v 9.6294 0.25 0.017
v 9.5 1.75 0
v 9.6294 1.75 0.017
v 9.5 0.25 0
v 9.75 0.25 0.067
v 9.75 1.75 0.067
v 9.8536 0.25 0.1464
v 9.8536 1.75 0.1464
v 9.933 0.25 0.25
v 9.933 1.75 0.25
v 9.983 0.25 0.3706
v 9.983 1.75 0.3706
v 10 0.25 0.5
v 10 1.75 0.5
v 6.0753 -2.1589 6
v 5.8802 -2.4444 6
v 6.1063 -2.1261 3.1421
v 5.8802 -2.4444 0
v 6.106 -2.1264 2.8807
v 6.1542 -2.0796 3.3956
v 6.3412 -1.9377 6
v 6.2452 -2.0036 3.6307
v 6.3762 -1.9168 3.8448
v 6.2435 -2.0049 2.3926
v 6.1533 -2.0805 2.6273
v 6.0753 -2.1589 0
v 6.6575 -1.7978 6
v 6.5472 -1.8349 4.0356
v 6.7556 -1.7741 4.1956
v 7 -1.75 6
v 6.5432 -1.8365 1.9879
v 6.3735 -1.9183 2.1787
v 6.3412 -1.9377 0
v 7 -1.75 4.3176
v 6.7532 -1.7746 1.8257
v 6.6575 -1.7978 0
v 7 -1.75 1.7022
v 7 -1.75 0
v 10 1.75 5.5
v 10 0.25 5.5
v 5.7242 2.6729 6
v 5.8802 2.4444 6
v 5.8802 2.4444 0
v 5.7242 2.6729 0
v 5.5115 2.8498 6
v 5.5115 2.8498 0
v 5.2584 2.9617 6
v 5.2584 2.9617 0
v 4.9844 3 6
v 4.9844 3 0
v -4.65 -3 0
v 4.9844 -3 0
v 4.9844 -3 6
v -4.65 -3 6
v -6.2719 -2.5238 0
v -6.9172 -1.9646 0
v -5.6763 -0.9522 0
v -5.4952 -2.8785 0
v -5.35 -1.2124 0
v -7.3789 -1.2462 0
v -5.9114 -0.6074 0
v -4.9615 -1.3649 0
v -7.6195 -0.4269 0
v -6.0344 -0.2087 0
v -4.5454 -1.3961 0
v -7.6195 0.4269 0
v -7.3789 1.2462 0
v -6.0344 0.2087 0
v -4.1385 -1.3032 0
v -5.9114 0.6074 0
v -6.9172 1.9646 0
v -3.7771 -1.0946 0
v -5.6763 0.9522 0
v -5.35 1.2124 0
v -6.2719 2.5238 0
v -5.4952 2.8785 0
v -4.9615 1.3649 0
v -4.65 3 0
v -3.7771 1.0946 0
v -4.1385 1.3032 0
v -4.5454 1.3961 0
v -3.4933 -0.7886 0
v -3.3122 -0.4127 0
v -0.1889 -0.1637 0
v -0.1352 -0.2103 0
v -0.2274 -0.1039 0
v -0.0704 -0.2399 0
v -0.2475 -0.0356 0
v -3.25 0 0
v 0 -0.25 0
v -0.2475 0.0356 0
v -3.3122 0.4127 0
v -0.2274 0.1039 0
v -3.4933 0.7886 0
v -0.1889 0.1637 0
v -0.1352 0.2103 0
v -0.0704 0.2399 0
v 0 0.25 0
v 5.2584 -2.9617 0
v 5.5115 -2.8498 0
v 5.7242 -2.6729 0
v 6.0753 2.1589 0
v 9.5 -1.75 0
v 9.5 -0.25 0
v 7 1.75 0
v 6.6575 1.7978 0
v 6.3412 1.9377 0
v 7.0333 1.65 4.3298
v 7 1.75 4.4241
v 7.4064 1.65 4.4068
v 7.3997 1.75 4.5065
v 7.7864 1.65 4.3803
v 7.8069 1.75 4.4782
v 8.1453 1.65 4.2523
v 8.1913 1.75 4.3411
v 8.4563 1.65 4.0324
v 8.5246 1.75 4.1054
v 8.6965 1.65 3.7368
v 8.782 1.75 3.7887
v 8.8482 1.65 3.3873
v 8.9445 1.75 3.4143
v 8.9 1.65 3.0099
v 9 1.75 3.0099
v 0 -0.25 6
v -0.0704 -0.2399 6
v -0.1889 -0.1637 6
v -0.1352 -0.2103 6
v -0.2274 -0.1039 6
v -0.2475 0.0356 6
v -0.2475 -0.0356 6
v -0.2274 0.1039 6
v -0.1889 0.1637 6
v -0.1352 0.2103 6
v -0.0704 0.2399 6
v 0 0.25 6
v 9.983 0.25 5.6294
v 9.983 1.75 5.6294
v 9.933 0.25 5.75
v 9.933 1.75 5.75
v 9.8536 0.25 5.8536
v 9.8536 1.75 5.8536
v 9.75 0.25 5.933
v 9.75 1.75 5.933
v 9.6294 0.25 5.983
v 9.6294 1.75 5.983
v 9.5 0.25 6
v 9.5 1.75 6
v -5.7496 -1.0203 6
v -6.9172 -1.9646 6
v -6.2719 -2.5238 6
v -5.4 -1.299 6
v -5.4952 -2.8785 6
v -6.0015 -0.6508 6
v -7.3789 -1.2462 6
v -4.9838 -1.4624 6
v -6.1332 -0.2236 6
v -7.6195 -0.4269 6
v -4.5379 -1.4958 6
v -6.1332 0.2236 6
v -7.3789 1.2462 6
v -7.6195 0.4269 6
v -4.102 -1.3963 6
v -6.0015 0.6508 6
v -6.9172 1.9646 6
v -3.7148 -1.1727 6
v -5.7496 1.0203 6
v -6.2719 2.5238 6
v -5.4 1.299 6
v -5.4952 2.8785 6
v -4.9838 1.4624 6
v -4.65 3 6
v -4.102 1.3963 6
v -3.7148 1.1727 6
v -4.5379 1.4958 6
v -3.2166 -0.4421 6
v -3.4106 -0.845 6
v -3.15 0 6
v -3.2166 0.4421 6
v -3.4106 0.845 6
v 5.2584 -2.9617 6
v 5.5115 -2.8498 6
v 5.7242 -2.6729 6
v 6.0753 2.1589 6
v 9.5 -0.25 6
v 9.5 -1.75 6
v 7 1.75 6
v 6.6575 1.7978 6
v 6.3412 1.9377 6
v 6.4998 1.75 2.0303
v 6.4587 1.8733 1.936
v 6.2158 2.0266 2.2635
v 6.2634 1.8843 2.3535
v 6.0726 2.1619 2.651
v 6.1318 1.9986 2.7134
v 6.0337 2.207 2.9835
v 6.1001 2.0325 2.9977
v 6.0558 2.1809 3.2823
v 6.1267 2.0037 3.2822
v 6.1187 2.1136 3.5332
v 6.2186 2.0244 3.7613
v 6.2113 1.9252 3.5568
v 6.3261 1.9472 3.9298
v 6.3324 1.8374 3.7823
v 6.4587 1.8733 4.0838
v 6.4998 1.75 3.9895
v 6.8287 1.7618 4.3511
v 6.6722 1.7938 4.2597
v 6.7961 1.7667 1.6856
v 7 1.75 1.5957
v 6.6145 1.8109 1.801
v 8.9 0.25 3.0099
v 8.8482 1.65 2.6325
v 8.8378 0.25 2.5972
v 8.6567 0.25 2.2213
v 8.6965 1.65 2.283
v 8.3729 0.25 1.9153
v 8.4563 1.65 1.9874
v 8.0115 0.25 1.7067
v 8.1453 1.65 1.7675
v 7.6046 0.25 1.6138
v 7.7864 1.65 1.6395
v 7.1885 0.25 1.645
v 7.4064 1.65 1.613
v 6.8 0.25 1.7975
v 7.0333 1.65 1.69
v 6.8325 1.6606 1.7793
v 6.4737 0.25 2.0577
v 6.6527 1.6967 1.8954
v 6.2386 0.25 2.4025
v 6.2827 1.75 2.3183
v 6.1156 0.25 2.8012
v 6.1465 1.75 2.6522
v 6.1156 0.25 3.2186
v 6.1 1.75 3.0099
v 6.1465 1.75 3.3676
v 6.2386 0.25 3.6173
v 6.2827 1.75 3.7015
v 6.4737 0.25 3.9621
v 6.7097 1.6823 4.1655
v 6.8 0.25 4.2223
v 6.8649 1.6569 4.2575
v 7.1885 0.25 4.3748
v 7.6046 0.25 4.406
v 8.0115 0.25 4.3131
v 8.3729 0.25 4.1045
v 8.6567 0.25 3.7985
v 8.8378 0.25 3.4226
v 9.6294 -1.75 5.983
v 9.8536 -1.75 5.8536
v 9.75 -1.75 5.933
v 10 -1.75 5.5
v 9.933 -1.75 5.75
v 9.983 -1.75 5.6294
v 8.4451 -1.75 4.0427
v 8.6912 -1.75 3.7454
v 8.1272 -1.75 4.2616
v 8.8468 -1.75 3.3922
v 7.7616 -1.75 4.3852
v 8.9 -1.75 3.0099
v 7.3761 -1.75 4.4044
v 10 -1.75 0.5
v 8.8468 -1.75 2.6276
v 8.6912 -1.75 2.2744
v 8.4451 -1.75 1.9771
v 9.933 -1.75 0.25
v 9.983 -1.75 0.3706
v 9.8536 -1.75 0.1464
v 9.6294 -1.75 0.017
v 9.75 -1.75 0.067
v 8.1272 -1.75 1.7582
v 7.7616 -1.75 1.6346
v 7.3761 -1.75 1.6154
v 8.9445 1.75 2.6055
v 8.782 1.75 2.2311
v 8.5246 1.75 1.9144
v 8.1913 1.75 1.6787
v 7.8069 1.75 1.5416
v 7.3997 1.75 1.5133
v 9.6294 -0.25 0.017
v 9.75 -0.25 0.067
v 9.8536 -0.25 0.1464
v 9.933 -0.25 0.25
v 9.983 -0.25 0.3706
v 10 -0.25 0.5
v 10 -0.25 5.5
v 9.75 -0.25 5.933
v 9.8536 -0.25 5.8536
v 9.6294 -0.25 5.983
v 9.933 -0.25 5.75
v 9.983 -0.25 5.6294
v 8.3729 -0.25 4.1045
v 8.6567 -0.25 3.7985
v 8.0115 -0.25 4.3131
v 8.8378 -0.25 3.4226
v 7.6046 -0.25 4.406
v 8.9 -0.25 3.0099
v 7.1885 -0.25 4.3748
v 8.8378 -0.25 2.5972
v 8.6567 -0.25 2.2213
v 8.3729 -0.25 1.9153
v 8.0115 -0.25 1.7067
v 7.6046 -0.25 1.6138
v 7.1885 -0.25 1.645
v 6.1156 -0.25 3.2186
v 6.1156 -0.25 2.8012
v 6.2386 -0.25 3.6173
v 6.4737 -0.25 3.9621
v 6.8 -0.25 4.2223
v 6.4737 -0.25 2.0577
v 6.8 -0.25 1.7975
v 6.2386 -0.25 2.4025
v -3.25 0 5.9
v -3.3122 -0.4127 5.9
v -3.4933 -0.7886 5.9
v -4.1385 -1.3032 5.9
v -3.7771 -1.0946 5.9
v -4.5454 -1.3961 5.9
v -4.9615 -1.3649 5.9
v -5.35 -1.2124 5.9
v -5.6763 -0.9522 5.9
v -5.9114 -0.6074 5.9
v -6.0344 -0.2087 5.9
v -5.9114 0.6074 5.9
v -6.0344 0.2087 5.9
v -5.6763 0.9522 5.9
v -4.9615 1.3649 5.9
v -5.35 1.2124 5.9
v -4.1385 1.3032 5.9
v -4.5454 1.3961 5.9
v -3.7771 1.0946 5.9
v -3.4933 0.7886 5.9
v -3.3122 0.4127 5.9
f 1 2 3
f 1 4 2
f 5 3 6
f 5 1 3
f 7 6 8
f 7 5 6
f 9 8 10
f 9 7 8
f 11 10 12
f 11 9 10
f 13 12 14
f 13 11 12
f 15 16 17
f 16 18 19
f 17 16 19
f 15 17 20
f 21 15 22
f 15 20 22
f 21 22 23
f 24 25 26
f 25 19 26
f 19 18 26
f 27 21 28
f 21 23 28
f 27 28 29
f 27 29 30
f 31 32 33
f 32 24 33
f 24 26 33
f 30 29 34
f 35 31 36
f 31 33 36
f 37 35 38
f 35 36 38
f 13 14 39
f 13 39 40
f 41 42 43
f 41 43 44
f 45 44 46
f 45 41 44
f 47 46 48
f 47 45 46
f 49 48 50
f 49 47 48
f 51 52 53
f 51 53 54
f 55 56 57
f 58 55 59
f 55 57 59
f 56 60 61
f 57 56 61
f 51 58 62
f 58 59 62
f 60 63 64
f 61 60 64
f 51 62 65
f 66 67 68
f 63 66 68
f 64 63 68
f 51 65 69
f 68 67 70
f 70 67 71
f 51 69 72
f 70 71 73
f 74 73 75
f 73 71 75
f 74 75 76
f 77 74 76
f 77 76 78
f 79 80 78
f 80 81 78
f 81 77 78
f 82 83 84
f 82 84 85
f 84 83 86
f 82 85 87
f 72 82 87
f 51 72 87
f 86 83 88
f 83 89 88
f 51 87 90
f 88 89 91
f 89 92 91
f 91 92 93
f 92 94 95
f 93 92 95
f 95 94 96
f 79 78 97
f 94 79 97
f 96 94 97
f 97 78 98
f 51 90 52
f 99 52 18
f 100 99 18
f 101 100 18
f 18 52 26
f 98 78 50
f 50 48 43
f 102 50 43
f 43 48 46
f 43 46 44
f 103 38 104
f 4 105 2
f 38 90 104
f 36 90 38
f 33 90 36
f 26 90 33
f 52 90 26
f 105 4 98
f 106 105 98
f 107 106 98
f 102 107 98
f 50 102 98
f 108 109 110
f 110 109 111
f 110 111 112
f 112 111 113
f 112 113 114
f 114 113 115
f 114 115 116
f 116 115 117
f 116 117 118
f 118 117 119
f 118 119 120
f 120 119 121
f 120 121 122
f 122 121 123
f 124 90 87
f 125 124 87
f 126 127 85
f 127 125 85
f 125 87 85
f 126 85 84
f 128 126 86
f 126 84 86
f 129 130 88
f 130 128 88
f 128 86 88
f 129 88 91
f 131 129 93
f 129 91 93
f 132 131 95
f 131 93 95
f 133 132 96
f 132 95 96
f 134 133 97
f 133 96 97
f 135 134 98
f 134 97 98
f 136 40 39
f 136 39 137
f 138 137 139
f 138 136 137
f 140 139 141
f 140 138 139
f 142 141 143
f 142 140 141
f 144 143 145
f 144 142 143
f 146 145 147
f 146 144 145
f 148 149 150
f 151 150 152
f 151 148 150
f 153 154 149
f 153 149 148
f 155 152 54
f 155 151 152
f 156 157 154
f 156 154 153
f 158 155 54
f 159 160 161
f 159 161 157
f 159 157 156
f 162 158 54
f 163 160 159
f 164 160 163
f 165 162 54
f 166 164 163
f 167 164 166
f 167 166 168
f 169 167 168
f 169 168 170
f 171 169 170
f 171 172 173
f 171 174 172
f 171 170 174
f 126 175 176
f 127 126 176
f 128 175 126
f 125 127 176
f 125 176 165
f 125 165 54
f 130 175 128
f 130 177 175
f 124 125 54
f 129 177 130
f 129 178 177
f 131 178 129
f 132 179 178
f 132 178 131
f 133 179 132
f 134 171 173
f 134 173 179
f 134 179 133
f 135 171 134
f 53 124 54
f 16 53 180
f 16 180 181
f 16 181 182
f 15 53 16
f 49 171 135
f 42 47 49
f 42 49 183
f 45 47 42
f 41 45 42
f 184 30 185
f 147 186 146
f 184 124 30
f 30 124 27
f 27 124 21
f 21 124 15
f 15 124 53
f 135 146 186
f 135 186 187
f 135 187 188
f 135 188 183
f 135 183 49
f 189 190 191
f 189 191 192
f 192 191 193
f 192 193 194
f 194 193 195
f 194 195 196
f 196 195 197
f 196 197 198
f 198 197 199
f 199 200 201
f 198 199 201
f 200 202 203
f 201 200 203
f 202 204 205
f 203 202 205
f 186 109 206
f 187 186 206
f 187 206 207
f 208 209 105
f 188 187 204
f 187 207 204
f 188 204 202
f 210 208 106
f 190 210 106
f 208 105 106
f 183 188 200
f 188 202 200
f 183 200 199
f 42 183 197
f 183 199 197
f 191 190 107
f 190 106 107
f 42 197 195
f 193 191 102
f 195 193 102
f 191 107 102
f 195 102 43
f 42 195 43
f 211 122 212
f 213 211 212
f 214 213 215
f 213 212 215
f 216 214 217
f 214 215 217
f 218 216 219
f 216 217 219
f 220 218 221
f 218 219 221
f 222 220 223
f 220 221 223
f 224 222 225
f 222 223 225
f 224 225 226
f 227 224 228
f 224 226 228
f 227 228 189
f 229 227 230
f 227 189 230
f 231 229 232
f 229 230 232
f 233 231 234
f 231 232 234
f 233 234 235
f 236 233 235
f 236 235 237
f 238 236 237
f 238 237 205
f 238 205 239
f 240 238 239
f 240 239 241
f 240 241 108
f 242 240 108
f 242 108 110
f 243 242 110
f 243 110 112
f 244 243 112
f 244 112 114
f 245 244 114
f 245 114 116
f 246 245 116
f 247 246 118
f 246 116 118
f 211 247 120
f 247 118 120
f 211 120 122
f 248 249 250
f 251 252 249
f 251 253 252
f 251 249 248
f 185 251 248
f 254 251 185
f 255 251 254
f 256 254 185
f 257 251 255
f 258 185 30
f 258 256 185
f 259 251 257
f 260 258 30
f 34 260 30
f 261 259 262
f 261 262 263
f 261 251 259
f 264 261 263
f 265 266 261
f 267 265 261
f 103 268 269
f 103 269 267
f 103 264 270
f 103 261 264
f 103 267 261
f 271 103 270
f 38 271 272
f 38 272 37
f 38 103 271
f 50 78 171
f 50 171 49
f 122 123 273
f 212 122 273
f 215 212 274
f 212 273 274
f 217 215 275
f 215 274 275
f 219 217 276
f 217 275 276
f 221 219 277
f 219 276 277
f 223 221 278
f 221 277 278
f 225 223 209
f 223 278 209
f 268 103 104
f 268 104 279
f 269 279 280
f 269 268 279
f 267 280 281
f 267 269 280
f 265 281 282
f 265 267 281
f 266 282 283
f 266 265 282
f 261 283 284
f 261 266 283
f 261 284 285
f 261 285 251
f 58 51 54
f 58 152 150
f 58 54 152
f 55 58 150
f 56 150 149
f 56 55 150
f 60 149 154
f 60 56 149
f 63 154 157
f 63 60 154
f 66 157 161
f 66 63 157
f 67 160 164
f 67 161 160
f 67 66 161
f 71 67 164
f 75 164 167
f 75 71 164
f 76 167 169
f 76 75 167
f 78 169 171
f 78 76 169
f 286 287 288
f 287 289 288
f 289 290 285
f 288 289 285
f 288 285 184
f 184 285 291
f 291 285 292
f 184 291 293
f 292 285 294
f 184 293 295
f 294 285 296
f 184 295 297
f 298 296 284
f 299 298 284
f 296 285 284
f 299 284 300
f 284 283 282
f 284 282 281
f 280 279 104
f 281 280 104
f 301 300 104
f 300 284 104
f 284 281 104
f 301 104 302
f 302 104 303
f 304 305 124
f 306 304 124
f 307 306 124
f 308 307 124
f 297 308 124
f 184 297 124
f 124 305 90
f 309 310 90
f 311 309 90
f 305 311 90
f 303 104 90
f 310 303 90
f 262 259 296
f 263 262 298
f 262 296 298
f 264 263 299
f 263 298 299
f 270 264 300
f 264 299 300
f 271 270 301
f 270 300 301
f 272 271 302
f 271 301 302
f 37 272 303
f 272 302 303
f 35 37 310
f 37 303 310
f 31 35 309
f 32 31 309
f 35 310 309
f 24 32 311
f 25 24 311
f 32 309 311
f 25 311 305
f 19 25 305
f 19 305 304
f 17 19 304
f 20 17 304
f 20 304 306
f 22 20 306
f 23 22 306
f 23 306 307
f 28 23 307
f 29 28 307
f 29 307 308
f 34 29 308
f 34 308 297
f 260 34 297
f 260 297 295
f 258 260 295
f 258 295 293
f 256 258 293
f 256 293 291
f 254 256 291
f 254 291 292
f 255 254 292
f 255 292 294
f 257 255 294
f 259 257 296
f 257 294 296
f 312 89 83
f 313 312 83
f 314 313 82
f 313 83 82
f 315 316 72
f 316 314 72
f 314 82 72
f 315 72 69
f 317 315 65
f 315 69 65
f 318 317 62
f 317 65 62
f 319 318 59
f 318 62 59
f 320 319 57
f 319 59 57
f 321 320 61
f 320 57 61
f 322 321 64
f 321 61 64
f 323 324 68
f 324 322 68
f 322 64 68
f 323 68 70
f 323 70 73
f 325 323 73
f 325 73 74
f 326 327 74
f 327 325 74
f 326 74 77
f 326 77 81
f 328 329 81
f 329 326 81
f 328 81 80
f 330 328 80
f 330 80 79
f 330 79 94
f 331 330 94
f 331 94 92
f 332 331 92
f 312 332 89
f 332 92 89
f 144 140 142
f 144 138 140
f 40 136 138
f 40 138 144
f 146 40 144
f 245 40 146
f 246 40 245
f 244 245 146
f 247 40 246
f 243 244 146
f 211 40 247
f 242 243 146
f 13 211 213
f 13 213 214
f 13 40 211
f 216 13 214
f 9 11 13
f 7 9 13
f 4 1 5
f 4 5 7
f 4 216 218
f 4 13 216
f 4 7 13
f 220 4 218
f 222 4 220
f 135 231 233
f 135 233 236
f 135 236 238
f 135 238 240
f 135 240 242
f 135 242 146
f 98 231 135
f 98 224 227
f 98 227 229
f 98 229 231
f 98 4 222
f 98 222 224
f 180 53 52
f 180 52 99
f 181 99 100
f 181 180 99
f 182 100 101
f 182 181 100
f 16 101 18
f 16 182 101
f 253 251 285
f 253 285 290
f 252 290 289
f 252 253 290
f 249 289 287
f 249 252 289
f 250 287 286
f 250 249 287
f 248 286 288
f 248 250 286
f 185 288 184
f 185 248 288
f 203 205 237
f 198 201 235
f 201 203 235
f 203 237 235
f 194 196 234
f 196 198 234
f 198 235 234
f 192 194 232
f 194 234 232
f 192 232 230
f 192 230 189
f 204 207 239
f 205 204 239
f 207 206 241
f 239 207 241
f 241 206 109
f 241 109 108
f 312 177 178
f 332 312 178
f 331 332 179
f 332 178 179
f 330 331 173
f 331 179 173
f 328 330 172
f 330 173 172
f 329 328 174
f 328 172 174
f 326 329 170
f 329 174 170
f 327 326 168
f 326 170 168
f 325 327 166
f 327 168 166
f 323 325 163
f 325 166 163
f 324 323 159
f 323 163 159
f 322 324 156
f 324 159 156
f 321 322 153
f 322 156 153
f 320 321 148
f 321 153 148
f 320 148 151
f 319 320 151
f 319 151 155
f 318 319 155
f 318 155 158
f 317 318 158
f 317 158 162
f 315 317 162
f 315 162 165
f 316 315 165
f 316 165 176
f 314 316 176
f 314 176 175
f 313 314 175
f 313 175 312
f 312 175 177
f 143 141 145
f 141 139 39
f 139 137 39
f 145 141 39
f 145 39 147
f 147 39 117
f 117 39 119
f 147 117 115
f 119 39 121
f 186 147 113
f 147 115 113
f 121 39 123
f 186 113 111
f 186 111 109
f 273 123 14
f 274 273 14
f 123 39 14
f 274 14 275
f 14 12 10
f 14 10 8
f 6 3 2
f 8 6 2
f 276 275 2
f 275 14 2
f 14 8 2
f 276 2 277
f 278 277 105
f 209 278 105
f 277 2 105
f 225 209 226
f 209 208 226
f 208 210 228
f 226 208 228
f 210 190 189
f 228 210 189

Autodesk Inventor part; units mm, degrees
ref_plane "YZ Plane" through (0, 0, 0) normal (1, 0, 0) x (0, 1, 0)
ref_plane "XZ Plane" through (0, 0, 0) normal (0, 1, 0) x (-1, 0, 0)
ref_plane "XY Plane" through (0, 0, 0) normal (0, 0, 1) x (1, 0, 0)
sketch "Sketch1" plane through (0, 0, 0) normal (0, 0, 1) x (1, 0, 0)
  line L0 (0, 0) -> (0, 0.56) construction
  line L1 (0, 0) -> (-1.0158, 0) construction
  line L2 (-4.65, 3) -> (5.75, 3)
  line L3 (5.75, -3) -> (-4.65, -3)
  line L4 (10, 0.25) -> (0, 0.25)
  line L5 (10, -0.25) -> (0, -0.25)
  arc A0 (0, 0.25) -> (0, -0.25) centre (0, 0) ccw
  line L6 (10, 1.75) -> (7, 1.75)
  line L7 (10, -1.75) -> (7, -1.75)
  arc A1 (-4.65, 3) -> (-4.65, -3) centre (-4.65, 0) ccw
  circle A2 centre (-4.65, 0) radius 1.4
  line L8 (10, 1.75) -> (10, 0.25)
  line L9 (10, -0.25) -> (10, -1.75)
  arc A3 (5.75, 3) -> (7, 1.75) centre (7, 3) ccw
  arc A4 (7, -1.75) -> (5.75, -3) centre (7, -3) ccw
  dimension "d2" = 0.5
  dimension "d5" = 2.8
  dimension "d6" = 6
  dimension "d8" = 10
  dimension "d9" = 1.5
  dimension "d10" = 3
  dimension "d12" = 3
extrude "Extrusion1" add sketch "Sketch1" along normal blind 6
sketch "Sketch2" plane through (7, 1.75, 0) normal (0, 1, 0) x (1, 0, 0)
  circle A0 centre (0.5, -3.0099) radius 1.4
  line L0 (3, 0) -> (3, -6) projected
  point P0 (-7, 0)
  dimension "d15" = 2.8
  dimension "d16" = 2.5
extrude "Extrusion2" cut sketch "Sketch2" along normal through all both and the other way through all
fillet "Fillet1" radius 0.5 1 edges at (10, 1, 6)
fillet "Fillet2" radius 0.5 1 edges at (10, -1, 6)
fillet "Fillet3" radius 0.5 1 edges at (10, 1, 0)
fillet "Fillet4" radius 0.5 1 edges at (10, -1, 0)
fillet "Fillet5" radius 1 1 edges at (5.75, 3, 3)
fillet "Fillet6" radius 1 1 edges at (5.75, -3, 3)
chamfer "Chamfer1" distance 0.1 angle 45 1 edges at (-6.05, 0, 6)
chamfer "Chamfer2" distance 0.1 angle 45 3 edges at (6.1, 2.1325, 3.0079) (8.2937, 1.75, 1.8567) (8.2937, 1.75, 4.1632)
equation "\"d17\" = d15"
properties part number "StringClamp"
